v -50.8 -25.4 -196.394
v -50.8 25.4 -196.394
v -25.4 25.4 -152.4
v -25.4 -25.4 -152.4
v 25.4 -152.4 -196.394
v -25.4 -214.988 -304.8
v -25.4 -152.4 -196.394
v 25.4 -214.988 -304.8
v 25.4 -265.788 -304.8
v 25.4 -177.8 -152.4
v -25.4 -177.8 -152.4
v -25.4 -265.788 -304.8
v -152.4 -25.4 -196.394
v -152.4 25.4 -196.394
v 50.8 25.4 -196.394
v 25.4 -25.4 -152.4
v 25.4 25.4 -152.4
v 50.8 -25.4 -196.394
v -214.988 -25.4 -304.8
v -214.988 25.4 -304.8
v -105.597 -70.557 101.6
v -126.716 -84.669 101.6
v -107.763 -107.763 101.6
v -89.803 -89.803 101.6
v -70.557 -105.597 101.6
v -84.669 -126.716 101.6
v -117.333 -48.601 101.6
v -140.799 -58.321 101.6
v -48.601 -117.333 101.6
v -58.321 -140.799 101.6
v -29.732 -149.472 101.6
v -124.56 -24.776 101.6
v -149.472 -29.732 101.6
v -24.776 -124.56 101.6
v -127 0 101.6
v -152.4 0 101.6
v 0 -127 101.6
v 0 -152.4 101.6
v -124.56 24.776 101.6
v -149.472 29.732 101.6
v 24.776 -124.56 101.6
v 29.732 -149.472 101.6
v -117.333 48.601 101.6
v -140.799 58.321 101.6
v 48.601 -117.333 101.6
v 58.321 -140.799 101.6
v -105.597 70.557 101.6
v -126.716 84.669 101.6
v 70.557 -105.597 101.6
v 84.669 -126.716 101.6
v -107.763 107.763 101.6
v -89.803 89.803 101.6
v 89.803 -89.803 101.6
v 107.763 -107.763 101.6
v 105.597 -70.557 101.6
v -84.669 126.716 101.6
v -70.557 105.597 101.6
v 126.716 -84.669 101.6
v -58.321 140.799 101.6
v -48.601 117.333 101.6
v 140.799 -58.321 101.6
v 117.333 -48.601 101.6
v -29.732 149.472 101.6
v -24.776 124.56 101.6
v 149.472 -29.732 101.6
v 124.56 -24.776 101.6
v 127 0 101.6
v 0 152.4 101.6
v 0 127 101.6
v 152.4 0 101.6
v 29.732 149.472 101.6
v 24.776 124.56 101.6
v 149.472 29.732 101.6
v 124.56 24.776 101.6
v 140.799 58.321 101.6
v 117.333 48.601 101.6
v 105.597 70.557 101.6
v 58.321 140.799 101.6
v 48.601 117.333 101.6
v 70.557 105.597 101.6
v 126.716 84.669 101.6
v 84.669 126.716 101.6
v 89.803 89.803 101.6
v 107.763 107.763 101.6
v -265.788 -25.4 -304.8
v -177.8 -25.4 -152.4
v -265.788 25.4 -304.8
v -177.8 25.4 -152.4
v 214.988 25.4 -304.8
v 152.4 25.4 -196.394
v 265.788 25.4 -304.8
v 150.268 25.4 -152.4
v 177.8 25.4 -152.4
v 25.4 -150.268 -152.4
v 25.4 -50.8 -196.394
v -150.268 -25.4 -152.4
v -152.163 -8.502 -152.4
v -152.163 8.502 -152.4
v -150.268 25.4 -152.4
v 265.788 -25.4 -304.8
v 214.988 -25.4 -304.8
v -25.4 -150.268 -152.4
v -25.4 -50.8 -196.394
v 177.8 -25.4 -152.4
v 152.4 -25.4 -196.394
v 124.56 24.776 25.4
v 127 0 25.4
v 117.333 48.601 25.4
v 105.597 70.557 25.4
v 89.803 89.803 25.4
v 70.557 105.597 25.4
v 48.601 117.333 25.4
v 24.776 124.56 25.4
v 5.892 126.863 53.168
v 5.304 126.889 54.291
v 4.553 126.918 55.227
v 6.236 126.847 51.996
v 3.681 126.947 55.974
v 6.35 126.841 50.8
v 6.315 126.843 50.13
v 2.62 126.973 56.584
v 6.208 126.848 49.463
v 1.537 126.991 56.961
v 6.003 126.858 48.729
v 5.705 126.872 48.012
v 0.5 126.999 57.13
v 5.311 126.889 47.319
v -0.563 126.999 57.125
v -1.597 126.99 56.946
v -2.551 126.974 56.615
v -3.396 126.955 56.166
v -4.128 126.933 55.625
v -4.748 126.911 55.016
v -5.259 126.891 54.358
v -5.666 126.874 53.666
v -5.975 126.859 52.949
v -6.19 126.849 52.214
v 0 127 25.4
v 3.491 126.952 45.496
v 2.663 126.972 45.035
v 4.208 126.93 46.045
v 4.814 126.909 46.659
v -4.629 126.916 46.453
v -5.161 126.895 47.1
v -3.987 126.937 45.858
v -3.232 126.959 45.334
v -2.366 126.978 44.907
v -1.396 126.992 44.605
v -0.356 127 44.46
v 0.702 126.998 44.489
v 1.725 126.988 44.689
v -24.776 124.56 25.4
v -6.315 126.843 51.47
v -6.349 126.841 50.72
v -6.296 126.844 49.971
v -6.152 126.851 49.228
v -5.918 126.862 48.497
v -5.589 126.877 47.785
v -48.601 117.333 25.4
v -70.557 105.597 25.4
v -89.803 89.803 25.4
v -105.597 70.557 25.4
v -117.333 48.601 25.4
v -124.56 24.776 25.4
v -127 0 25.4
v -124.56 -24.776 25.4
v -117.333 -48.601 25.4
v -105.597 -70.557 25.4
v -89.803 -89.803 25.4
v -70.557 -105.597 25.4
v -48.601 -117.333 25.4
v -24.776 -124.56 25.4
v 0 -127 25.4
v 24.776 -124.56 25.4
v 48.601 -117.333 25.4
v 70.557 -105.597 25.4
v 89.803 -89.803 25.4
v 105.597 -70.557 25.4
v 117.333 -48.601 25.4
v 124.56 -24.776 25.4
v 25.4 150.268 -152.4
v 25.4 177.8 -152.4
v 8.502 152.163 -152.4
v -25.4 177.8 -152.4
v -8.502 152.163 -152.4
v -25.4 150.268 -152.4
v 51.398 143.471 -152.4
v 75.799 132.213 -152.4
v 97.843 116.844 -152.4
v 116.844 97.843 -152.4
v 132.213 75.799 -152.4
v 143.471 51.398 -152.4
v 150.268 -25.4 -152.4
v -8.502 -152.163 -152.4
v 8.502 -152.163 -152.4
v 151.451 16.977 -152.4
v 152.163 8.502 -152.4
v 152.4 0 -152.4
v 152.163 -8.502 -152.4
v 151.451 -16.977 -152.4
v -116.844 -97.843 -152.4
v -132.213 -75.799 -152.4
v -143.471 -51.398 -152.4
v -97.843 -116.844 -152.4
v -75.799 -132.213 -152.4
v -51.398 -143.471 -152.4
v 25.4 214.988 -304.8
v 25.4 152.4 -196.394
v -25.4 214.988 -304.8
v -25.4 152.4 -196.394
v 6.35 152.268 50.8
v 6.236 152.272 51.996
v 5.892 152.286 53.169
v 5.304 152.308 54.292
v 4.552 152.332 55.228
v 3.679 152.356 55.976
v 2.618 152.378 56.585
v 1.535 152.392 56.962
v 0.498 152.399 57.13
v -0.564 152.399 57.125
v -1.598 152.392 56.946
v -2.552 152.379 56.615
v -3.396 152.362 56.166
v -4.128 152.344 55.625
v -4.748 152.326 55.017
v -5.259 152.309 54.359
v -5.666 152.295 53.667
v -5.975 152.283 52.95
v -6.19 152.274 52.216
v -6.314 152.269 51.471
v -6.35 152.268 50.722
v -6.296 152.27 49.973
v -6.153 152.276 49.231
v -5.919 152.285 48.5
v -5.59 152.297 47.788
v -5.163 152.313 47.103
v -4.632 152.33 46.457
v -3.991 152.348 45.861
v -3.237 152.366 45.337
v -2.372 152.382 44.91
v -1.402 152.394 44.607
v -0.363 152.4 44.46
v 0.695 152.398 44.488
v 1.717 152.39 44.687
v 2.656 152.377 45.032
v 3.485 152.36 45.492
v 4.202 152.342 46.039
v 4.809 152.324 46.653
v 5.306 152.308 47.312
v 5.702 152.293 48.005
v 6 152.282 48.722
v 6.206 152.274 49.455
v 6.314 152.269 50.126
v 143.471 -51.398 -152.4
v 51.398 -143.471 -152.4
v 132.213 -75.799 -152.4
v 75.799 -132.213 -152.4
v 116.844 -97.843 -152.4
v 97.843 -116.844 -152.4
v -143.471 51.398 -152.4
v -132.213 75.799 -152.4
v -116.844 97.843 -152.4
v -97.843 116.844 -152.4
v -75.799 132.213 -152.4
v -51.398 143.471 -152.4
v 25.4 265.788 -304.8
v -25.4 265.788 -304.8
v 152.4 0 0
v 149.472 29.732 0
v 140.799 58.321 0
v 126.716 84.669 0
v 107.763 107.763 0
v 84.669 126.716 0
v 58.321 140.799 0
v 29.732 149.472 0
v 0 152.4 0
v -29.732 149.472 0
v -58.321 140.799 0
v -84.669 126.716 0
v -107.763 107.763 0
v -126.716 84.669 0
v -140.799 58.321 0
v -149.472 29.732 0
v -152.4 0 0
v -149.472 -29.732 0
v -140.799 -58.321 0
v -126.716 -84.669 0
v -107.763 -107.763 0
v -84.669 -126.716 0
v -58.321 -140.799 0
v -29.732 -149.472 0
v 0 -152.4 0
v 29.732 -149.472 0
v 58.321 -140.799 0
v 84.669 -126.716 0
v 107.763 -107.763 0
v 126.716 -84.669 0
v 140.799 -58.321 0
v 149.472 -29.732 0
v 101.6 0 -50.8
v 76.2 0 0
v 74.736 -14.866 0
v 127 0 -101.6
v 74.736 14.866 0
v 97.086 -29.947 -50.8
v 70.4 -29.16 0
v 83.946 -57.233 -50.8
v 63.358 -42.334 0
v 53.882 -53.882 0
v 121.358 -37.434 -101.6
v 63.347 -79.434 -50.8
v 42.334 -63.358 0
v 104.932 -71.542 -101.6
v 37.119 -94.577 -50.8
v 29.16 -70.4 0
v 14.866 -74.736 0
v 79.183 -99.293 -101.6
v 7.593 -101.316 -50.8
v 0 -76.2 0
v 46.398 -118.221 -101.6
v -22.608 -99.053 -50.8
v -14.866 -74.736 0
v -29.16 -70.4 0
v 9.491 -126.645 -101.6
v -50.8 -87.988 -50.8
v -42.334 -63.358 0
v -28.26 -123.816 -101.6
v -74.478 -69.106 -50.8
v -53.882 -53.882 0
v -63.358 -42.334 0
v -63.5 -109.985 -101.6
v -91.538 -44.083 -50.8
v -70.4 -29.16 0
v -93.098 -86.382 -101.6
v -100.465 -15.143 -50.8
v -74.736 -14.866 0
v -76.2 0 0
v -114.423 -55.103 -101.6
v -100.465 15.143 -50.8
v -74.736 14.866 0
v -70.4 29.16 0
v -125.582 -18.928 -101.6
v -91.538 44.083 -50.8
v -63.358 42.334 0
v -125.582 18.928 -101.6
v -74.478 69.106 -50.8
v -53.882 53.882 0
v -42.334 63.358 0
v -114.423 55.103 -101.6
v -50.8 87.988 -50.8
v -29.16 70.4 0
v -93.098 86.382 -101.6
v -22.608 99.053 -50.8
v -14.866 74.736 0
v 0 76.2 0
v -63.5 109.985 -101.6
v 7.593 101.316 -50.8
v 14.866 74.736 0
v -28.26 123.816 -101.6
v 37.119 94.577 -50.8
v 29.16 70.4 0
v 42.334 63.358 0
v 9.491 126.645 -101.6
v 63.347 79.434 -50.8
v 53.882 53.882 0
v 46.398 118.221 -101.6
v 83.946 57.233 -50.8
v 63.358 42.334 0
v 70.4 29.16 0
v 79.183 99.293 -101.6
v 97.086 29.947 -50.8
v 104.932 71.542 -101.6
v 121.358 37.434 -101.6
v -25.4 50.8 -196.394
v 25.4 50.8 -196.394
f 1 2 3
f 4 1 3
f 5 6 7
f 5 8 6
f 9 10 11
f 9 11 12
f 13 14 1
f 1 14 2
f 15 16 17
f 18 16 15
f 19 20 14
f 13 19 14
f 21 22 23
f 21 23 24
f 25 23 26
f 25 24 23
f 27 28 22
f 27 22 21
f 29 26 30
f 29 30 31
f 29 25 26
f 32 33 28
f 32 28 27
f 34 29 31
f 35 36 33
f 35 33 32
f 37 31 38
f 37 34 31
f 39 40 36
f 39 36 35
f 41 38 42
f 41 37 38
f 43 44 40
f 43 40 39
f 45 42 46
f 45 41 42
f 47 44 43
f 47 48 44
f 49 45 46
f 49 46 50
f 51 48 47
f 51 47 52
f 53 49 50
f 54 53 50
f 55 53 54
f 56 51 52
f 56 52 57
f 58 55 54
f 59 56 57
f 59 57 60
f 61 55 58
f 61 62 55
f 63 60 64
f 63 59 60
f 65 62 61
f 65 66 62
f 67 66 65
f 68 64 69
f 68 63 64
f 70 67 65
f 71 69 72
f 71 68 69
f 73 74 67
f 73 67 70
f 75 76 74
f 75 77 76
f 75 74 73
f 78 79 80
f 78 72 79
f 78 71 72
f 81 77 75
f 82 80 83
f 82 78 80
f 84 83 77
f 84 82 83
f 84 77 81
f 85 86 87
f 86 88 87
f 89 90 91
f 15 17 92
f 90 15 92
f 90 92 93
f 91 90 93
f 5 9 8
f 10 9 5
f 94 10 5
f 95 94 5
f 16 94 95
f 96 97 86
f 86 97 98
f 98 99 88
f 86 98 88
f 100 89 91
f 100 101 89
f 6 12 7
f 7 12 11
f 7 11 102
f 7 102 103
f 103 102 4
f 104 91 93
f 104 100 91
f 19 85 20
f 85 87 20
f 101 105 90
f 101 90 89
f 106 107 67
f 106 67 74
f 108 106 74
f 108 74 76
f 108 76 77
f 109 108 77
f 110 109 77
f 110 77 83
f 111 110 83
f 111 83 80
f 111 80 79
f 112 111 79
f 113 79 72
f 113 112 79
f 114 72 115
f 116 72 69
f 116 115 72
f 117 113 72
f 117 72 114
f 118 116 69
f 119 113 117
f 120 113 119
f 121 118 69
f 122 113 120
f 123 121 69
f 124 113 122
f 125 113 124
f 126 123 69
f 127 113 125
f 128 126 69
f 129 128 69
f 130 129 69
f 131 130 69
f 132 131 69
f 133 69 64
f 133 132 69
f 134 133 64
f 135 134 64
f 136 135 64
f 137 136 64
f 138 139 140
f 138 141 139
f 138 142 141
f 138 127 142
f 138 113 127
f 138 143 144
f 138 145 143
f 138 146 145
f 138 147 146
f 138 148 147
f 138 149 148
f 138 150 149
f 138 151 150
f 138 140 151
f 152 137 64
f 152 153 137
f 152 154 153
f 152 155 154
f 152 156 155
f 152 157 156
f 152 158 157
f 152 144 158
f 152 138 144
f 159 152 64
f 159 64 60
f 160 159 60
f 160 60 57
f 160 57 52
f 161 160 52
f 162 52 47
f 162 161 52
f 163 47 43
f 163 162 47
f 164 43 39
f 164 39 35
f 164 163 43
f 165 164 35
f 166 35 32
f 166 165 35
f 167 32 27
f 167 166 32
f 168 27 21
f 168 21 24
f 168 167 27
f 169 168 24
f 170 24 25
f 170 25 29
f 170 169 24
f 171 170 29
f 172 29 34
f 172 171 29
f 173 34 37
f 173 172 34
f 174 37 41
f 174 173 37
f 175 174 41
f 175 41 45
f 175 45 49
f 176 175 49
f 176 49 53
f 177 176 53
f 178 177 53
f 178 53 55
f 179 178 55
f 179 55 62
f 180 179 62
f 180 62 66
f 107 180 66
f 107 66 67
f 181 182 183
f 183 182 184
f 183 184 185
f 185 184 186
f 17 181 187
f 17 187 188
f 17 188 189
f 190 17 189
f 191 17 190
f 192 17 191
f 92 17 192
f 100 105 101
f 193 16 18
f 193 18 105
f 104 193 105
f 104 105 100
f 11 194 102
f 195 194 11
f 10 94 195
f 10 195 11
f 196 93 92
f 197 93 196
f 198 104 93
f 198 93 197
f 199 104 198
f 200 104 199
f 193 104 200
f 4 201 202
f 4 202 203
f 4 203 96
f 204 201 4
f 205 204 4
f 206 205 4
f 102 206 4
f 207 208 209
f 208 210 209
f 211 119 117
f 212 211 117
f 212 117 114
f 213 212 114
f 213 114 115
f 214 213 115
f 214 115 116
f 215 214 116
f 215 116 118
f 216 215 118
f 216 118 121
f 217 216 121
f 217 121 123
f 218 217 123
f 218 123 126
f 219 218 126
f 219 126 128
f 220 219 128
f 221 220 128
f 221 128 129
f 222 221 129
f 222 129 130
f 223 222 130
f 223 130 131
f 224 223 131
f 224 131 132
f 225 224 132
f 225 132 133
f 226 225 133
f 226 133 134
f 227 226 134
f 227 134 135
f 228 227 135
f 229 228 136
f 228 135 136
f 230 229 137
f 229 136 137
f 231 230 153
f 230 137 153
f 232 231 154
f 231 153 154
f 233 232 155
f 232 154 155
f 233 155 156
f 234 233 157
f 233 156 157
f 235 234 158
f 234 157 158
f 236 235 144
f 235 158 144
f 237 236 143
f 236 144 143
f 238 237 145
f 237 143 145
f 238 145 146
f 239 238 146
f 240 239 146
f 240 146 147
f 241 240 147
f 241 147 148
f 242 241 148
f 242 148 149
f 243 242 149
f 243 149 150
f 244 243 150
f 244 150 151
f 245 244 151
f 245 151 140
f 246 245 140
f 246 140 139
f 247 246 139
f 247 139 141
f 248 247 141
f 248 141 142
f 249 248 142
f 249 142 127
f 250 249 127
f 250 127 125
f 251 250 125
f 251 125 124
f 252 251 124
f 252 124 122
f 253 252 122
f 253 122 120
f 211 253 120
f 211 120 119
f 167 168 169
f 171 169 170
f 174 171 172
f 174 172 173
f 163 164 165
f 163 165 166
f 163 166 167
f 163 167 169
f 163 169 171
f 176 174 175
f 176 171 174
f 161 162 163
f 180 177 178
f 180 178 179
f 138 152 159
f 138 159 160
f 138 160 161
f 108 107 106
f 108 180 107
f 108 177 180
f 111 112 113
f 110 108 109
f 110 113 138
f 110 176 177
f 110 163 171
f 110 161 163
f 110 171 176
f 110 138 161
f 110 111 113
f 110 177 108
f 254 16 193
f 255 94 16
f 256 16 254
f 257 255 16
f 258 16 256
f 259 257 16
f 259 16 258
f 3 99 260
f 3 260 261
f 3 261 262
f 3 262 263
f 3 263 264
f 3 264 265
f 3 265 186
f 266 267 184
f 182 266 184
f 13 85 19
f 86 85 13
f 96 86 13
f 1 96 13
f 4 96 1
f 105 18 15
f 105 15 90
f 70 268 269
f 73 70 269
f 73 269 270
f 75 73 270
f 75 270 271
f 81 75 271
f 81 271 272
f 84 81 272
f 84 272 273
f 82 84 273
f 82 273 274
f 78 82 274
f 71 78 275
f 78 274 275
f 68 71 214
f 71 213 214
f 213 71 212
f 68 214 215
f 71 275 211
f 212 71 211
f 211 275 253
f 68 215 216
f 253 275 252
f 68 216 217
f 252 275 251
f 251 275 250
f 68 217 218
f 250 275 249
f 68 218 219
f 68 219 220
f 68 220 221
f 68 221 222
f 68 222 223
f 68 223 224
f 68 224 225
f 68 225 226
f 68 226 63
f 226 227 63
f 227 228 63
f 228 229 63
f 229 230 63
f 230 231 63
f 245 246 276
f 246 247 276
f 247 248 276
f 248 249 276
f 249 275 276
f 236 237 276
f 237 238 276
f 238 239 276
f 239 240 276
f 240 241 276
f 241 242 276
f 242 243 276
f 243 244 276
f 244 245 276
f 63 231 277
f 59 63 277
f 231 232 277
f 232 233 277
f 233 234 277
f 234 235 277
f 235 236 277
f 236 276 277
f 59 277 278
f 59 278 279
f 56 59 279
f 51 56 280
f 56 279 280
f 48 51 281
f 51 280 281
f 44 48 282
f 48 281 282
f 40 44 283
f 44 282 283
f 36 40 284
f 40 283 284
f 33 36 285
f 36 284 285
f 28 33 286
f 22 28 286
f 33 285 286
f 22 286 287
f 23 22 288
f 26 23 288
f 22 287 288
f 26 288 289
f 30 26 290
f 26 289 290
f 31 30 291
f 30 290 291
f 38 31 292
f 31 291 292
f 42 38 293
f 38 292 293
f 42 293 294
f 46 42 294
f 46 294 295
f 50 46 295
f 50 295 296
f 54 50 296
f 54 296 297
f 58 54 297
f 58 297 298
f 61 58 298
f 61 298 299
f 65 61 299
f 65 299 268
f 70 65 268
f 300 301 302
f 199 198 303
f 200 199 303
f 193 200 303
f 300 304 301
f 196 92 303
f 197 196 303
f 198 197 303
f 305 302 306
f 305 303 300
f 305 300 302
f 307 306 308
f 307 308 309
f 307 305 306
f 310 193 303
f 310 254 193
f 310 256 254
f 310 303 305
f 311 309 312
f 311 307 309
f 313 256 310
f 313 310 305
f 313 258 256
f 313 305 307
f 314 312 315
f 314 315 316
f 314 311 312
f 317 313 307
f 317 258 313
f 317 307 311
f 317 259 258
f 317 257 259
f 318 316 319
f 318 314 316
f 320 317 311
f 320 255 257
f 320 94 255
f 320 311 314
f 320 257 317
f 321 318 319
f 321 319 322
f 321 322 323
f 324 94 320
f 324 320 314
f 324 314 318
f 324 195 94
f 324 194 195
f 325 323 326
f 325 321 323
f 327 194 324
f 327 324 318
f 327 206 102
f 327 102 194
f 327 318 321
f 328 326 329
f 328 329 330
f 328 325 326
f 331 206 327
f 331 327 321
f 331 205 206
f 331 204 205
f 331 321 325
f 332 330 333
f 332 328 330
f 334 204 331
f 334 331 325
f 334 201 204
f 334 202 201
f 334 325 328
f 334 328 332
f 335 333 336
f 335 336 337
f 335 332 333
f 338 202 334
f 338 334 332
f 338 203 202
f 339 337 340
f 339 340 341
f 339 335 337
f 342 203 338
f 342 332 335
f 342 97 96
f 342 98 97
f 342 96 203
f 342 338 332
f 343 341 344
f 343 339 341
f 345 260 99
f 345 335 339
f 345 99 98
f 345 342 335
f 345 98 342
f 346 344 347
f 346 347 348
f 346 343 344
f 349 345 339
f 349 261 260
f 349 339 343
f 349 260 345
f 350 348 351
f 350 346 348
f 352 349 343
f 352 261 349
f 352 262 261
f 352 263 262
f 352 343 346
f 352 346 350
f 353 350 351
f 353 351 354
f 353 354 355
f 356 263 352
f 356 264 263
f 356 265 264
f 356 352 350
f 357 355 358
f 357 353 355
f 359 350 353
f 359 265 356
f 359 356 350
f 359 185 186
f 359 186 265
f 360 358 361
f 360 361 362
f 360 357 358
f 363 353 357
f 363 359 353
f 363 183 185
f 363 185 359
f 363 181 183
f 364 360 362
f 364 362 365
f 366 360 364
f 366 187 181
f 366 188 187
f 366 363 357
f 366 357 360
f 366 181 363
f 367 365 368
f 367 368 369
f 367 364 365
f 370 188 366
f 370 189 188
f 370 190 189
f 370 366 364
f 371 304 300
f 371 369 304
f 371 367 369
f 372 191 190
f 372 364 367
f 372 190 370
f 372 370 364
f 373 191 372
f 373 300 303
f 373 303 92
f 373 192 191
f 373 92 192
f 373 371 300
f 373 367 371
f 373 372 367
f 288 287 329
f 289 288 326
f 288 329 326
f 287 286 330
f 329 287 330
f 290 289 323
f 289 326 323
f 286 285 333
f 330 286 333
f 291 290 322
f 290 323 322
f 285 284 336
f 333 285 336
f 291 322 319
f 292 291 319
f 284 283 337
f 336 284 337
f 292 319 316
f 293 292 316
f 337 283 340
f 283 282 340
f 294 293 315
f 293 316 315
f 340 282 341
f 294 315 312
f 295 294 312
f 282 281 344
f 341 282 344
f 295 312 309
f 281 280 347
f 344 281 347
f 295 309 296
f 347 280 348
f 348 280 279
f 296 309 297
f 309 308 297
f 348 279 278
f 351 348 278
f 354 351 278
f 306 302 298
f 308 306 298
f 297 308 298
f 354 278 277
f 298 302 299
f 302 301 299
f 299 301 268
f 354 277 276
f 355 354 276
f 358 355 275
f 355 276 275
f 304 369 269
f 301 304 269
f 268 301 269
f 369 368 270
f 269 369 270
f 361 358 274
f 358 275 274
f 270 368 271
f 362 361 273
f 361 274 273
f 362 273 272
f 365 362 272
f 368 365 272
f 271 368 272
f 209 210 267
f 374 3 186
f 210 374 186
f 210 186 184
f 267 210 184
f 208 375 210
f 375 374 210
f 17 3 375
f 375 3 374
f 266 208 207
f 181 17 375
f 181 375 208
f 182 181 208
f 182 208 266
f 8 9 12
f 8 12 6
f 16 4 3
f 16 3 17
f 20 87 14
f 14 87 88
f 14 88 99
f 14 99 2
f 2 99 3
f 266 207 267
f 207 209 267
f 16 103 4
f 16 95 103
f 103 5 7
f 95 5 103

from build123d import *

# Parameters (mm, degrees)
F0_R      = 127
F1_DEPTH  = 25.4
F0_R_2    = 152.4
F2_DEPTH  = 101.6
F3_R      = 6.35
F4_DEPTH  = 152.401
F5_R      = 76.2
F7_R      = 152.4
F10_DEPTH = 25.4
F12_DEPTH = 25.4


with BuildPart() as f1:
    # F0 (on Top) → F1 (new body)
    with BuildSketch(Plane.XY):
        Circle(F0_R)
    extrude(amount=F1_DEPTH)

    # F0 (on Top) → F2 (join)
    with BuildSketch(Plane.XY):
        Circle(F0_R_2)
        Circle(F0_R, mode=Mode.SUBTRACT)
    extrude(amount=F2_DEPTH)

    # F3 (on Front) → F4 (cut, through all)
    with BuildSketch(Plane.XZ):
        with Locations((0, 50.8)):
            Circle(F3_R)
    extrude(amount=-F4_DEPTH, mode=Mode.SUBTRACT)

    # F5 (on face) → F8 section 0
    with BuildSketch(Plane(origin=(0, 0, 0), x_dir=(1, 0, 0), z_dir=(0, 0, -1))):
        Circle(F5_R)
    # F7 (on offset) → F8 section 1
    with BuildSketch(Plane(origin=(0, 0, -152.4), x_dir=(1, 0, 0), z_dir=(0, 0, -1))):
        Circle(F7_R)
    loft()

    # F9 (on Front) → F10 (join, symmetric)
    with BuildSketch(Plane.XZ):
        Polygon((-50.8, -196.394091), (-25.4, -152.4), (-152.4, -152.4), (-177.8, -152.4), (-265.788181, -304.8), (-214.988181, -304.8), (-152.4, -196.394091), align=None)
        Polygon((177.8, -152.4), (152.4, -152.4), (152.4, -196.394091), (214.988181, -304.8), (265.788181, -304.8), align=None)
        Polygon((152.4, -152.4), (25.4, -152.4), (50.8, -196.394091), (152.4, -196.394091), align=None)
    extrude(amount=F10_DEPTH, both=True)

    # F11 (on Right) → F12 (join, symmetric)
    with BuildSketch(Plane.YZ):
        Polygon((152.4, -152.4), (25.4, -152.4), (50.8, -196.394091), (152.4, -196.394091), align=None)
        Polygon((-50.8, -196.394091), (-25.4, -152.4), (-152.4, -152.4), (-152.4, -196.394091), align=None)
        Polygon((177.8, -152.4), (152.4, -152.4), (152.4, -196.394091), (214.988181, -304.8), (265.788181, -304.8), align=None)
        Polygon((-152.4, -196.394091), (-152.4, -152.4), (-177.8, -152.4), (-265.788181, -304.8), (-214.988181, -304.8), align=None)
    extrude(amount=F12_DEPTH, both=True)


solid = f1.part
